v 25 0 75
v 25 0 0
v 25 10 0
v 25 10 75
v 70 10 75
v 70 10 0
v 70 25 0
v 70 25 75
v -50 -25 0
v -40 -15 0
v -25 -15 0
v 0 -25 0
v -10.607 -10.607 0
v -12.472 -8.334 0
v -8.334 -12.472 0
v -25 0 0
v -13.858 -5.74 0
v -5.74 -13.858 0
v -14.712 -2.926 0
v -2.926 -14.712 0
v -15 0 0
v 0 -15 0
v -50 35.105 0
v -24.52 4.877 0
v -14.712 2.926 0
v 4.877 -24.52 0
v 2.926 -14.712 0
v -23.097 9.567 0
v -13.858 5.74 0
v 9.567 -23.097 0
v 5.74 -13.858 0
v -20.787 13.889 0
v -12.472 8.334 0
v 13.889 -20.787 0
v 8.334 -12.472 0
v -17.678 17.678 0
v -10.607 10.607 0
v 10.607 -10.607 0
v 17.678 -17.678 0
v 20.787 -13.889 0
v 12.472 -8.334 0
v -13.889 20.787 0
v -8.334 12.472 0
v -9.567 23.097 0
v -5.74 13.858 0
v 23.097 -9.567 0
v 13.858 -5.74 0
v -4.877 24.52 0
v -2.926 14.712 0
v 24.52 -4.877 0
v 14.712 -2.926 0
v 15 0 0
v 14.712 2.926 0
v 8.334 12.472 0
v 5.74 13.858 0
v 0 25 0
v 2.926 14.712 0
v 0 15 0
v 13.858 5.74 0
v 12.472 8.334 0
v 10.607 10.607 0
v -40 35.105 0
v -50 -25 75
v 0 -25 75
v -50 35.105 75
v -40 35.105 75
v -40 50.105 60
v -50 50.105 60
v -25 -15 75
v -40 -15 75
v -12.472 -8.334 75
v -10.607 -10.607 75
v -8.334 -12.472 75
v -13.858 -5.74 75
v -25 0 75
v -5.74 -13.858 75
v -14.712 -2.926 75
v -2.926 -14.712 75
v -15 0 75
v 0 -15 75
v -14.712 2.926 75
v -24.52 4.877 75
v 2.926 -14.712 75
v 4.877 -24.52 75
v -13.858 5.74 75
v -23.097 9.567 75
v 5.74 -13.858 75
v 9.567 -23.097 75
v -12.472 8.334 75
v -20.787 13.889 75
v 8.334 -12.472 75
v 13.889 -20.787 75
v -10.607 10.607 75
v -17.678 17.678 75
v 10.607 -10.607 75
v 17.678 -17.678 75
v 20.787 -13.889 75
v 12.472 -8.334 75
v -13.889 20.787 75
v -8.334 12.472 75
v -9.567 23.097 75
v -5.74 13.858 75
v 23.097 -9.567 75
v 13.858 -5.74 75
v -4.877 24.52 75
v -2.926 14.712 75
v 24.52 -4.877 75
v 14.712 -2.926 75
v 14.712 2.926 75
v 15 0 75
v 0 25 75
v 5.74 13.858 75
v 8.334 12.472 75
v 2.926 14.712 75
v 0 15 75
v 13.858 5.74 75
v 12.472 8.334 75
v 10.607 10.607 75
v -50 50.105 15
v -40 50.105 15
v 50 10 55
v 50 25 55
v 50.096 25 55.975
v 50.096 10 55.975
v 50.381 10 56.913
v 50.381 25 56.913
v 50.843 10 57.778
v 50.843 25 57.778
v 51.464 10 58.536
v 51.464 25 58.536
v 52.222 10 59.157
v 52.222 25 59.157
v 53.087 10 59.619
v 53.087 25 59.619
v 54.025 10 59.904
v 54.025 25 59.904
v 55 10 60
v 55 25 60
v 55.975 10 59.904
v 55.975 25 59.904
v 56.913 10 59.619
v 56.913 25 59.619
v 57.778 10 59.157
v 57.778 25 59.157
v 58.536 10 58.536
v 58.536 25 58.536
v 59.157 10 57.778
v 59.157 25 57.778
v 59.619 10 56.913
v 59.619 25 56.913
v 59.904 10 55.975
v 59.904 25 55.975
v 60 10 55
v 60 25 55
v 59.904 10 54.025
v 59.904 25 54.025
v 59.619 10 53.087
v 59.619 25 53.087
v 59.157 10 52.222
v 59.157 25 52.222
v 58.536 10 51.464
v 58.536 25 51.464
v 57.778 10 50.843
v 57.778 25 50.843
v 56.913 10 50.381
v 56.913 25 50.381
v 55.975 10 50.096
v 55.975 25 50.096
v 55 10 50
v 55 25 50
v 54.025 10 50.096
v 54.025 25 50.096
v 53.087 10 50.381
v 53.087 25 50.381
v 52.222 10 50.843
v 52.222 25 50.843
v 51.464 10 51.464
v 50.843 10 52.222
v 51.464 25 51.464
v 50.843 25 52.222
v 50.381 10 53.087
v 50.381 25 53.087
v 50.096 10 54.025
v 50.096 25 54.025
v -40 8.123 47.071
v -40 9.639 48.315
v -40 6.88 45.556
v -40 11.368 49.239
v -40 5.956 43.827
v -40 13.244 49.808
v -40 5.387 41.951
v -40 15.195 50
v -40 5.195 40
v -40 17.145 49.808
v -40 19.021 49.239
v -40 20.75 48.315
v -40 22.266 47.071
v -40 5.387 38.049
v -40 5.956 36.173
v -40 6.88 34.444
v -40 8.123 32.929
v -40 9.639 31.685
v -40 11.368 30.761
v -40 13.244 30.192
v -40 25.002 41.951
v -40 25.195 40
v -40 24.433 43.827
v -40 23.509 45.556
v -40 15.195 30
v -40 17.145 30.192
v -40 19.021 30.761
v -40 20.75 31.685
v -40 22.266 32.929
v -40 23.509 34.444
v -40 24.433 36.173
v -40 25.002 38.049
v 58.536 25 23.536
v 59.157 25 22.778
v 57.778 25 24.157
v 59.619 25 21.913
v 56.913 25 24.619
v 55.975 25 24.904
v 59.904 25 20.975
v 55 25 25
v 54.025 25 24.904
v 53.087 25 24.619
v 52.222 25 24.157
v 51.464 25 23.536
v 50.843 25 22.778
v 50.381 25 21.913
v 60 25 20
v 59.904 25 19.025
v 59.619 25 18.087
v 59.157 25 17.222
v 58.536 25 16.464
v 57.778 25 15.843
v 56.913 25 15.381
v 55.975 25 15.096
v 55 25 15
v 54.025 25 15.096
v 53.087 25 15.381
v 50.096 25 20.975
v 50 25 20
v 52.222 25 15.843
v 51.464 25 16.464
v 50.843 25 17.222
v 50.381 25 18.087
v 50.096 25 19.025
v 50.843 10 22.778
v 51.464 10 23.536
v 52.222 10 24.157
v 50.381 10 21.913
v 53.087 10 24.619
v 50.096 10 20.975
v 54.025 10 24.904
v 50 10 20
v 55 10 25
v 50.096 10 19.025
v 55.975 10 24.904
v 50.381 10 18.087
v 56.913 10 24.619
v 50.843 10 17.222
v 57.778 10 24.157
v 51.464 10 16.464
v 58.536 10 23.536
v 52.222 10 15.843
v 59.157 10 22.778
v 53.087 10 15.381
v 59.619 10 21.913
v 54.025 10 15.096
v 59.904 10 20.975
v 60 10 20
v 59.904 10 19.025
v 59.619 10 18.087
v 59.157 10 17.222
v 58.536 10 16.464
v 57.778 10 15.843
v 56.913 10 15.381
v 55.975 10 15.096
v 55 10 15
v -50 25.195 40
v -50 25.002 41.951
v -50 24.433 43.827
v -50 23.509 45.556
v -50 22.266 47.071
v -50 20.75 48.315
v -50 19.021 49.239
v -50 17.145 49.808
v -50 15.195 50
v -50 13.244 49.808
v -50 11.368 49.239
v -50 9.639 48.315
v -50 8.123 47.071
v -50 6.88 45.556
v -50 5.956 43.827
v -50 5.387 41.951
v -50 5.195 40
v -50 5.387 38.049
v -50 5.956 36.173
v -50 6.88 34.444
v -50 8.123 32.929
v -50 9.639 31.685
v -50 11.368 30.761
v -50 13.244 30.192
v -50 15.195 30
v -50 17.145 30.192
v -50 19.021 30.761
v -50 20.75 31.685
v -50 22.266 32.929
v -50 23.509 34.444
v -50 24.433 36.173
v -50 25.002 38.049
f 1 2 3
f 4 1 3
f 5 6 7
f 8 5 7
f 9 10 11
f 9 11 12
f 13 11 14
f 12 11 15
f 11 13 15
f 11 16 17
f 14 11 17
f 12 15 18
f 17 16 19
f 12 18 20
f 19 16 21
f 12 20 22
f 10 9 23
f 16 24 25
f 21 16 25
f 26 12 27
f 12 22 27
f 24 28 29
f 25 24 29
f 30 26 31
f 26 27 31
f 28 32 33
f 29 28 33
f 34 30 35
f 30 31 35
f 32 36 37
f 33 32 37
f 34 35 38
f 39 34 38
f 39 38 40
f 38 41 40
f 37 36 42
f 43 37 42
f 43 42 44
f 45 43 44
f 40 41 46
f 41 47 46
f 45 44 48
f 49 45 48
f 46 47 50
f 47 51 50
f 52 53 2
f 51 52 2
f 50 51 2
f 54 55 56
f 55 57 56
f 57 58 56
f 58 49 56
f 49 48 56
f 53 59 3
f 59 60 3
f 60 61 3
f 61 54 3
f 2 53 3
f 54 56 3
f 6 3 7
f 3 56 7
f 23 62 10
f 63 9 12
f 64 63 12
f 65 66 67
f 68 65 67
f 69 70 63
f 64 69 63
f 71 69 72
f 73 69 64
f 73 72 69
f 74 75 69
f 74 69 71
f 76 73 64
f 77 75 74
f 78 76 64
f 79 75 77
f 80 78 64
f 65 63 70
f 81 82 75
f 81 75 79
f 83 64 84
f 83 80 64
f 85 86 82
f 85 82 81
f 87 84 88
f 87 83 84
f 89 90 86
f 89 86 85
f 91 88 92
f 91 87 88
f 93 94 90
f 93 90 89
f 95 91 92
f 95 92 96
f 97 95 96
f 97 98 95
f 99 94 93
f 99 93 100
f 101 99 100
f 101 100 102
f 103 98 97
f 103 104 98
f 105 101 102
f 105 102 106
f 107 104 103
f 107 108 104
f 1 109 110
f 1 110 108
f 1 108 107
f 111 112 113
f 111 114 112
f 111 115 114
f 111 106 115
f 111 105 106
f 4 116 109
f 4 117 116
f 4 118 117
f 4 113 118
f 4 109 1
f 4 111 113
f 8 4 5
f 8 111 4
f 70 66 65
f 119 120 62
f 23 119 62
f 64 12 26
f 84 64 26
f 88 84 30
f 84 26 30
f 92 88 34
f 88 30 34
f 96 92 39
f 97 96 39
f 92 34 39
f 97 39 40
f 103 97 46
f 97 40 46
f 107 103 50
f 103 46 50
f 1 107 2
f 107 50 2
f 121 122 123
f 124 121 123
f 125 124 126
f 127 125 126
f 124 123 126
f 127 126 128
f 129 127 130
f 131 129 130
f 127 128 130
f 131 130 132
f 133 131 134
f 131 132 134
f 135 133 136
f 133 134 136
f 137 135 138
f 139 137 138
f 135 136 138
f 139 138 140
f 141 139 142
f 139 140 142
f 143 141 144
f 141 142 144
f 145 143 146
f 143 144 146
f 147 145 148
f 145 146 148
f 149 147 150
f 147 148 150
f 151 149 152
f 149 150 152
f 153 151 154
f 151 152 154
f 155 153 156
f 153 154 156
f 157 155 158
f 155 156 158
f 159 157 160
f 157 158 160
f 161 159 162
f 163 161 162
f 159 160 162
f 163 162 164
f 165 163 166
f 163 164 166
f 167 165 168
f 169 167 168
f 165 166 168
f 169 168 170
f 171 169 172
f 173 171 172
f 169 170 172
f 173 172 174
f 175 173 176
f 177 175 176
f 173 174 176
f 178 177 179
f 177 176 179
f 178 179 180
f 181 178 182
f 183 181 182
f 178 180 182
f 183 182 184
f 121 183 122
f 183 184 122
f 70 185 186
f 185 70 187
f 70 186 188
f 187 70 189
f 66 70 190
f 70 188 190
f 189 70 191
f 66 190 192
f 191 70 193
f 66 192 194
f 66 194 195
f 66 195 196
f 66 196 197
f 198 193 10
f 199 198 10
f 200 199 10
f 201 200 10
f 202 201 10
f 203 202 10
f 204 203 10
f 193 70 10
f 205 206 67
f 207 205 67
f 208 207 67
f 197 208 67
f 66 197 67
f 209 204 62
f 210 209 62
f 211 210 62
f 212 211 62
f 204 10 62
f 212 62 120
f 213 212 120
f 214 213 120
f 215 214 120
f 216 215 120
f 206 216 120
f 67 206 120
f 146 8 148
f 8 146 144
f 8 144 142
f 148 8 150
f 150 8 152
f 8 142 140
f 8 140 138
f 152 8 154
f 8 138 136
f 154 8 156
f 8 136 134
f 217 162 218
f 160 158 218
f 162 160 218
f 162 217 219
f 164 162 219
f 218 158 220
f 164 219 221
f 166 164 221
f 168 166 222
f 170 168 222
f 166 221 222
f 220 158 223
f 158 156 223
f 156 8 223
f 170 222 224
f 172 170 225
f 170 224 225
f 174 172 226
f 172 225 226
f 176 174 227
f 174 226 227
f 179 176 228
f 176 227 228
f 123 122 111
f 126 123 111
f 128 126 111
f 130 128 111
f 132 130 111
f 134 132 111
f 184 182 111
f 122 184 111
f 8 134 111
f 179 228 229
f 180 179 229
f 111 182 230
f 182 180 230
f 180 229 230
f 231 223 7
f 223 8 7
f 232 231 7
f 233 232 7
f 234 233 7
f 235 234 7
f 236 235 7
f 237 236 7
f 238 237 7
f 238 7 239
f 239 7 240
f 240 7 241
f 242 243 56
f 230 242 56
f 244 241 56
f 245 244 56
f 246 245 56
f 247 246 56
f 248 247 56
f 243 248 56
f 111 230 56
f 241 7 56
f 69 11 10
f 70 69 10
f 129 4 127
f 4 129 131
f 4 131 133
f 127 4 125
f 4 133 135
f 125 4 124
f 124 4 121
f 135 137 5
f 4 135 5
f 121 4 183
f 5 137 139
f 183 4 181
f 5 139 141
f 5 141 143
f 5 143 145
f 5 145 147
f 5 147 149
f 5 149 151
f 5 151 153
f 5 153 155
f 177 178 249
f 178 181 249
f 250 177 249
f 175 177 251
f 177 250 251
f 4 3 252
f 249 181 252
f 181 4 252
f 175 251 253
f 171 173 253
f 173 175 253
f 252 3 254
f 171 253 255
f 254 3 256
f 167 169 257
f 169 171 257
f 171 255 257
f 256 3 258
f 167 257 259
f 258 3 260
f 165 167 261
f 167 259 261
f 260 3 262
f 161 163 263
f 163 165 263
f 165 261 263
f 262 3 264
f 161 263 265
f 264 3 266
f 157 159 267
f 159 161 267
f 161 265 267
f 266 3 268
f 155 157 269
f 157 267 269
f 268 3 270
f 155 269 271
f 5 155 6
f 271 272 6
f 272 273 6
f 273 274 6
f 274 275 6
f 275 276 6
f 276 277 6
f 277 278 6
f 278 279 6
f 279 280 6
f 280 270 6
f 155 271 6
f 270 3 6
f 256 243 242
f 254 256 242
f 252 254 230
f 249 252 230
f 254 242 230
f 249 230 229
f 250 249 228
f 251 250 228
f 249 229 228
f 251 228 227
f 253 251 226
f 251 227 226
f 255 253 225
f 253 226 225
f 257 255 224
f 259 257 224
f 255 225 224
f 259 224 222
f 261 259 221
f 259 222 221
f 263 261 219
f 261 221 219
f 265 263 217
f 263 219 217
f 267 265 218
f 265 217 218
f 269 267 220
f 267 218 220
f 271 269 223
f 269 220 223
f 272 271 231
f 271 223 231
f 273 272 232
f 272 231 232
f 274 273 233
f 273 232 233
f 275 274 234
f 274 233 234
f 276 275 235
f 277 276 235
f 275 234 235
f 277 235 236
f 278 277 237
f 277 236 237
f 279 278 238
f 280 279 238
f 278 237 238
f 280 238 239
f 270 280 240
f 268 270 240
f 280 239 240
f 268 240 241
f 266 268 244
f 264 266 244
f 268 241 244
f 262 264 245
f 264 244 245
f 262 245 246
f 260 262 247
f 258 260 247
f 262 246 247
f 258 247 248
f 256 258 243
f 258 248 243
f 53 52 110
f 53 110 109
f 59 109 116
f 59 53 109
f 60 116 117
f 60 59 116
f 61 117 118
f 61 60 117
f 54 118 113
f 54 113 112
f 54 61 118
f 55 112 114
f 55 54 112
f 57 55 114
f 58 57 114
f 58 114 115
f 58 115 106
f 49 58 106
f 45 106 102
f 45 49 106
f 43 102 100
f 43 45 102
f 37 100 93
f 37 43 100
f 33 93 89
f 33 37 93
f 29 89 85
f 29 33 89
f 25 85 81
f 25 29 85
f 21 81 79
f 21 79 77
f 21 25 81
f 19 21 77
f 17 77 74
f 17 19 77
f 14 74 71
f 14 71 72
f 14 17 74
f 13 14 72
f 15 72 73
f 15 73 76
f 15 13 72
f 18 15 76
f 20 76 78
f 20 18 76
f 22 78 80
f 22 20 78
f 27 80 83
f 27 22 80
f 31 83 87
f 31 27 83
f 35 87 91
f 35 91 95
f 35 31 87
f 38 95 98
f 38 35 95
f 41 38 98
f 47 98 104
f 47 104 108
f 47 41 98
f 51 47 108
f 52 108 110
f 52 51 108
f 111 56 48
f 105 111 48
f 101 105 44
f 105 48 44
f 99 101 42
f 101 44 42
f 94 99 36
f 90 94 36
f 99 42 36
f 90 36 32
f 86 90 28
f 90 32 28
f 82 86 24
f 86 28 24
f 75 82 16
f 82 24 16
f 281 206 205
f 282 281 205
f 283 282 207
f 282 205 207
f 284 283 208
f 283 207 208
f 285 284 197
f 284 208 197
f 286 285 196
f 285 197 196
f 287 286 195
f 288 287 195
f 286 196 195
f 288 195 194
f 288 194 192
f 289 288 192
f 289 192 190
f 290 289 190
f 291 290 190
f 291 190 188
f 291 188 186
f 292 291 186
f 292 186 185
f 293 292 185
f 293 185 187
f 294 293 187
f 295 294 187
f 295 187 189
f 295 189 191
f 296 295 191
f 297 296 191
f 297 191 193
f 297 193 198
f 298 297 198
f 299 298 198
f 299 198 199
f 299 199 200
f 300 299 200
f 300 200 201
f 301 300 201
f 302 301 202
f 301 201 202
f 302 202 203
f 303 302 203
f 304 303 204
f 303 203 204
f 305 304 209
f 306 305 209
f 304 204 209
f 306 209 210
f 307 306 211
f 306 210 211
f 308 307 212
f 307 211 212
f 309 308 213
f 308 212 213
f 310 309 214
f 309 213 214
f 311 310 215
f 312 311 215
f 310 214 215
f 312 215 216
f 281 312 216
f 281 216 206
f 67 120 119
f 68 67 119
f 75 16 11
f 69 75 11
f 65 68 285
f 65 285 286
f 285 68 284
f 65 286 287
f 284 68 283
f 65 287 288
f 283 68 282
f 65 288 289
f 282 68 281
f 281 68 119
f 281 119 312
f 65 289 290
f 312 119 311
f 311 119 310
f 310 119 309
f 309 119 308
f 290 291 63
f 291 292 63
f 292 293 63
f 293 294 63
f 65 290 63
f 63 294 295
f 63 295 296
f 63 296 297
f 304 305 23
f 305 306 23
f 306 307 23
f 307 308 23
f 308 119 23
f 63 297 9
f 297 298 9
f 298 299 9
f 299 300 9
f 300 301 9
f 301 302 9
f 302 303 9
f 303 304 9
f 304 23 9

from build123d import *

# Parameters (mm, degrees)
F0_R     = 15
F1_DEPTH = 75
F2_R     = 5
F3_DEPTH = 15
F4_R     = 10
F5_DEPTH = 25


with BuildPart() as f1:
    # F0 (on Top) → F1 (new body)
    with BuildSketch(Plane.XY):
        with BuildLine():
            Line((-50, -25), (0, -25))
            ThreePointArc((0, -25), (17.67767, -17.67767), (25, 0))
            Line((25, 0), (25, 10))
            Line((25, 10), (70, 10))
            Line((70, 10), (70, 25))
            Line((70, 25), (0, 25))
            ThreePointArc((0, 25), (-17.67767, 17.67767), (-25, 0))
            Line((-25, 0), (-25, -15))
            Line((-25, -15), (-40, -15))
            Line((-40, -15), (-40, 50.105155))
            Line((-40, 50.105155), (-50, 50.105155))
            Line((-50, 50.105155), (-50, -25))
        make_face()
        Circle(F0_R, mode=Mode.SUBTRACT)
    extrude(amount=F1_DEPTH)

    # F2 (on face) → F3 (cut)
    with BuildSketch(Plane(origin=(0, 25, 0), x_dir=(-1, 0, 0), z_dir=(0, 1, 0))):
        with Locations((-55, 20)):
            Circle(F2_R)
        with Locations((-55, 55)):
            Circle(F2_R)
    extrude(amount=-F3_DEPTH, mode=Mode.SUBTRACT)

    # F4 (on face) → F5 (cut)
    with BuildSketch(Plane.YZ.offset(-40)):
        with Locations((15.194554, 40)):
            Circle(F4_R)
        Polygon((35.105155, 75), (50.105155, 60), (50.105155, 75), align=None)
        Polygon((50.105155, 0), (50.105155, 15), (35.105155, 0), align=None)
    extrude(amount=-F5_DEPTH, mode=Mode.SUBTRACT)


solid = f1.part
